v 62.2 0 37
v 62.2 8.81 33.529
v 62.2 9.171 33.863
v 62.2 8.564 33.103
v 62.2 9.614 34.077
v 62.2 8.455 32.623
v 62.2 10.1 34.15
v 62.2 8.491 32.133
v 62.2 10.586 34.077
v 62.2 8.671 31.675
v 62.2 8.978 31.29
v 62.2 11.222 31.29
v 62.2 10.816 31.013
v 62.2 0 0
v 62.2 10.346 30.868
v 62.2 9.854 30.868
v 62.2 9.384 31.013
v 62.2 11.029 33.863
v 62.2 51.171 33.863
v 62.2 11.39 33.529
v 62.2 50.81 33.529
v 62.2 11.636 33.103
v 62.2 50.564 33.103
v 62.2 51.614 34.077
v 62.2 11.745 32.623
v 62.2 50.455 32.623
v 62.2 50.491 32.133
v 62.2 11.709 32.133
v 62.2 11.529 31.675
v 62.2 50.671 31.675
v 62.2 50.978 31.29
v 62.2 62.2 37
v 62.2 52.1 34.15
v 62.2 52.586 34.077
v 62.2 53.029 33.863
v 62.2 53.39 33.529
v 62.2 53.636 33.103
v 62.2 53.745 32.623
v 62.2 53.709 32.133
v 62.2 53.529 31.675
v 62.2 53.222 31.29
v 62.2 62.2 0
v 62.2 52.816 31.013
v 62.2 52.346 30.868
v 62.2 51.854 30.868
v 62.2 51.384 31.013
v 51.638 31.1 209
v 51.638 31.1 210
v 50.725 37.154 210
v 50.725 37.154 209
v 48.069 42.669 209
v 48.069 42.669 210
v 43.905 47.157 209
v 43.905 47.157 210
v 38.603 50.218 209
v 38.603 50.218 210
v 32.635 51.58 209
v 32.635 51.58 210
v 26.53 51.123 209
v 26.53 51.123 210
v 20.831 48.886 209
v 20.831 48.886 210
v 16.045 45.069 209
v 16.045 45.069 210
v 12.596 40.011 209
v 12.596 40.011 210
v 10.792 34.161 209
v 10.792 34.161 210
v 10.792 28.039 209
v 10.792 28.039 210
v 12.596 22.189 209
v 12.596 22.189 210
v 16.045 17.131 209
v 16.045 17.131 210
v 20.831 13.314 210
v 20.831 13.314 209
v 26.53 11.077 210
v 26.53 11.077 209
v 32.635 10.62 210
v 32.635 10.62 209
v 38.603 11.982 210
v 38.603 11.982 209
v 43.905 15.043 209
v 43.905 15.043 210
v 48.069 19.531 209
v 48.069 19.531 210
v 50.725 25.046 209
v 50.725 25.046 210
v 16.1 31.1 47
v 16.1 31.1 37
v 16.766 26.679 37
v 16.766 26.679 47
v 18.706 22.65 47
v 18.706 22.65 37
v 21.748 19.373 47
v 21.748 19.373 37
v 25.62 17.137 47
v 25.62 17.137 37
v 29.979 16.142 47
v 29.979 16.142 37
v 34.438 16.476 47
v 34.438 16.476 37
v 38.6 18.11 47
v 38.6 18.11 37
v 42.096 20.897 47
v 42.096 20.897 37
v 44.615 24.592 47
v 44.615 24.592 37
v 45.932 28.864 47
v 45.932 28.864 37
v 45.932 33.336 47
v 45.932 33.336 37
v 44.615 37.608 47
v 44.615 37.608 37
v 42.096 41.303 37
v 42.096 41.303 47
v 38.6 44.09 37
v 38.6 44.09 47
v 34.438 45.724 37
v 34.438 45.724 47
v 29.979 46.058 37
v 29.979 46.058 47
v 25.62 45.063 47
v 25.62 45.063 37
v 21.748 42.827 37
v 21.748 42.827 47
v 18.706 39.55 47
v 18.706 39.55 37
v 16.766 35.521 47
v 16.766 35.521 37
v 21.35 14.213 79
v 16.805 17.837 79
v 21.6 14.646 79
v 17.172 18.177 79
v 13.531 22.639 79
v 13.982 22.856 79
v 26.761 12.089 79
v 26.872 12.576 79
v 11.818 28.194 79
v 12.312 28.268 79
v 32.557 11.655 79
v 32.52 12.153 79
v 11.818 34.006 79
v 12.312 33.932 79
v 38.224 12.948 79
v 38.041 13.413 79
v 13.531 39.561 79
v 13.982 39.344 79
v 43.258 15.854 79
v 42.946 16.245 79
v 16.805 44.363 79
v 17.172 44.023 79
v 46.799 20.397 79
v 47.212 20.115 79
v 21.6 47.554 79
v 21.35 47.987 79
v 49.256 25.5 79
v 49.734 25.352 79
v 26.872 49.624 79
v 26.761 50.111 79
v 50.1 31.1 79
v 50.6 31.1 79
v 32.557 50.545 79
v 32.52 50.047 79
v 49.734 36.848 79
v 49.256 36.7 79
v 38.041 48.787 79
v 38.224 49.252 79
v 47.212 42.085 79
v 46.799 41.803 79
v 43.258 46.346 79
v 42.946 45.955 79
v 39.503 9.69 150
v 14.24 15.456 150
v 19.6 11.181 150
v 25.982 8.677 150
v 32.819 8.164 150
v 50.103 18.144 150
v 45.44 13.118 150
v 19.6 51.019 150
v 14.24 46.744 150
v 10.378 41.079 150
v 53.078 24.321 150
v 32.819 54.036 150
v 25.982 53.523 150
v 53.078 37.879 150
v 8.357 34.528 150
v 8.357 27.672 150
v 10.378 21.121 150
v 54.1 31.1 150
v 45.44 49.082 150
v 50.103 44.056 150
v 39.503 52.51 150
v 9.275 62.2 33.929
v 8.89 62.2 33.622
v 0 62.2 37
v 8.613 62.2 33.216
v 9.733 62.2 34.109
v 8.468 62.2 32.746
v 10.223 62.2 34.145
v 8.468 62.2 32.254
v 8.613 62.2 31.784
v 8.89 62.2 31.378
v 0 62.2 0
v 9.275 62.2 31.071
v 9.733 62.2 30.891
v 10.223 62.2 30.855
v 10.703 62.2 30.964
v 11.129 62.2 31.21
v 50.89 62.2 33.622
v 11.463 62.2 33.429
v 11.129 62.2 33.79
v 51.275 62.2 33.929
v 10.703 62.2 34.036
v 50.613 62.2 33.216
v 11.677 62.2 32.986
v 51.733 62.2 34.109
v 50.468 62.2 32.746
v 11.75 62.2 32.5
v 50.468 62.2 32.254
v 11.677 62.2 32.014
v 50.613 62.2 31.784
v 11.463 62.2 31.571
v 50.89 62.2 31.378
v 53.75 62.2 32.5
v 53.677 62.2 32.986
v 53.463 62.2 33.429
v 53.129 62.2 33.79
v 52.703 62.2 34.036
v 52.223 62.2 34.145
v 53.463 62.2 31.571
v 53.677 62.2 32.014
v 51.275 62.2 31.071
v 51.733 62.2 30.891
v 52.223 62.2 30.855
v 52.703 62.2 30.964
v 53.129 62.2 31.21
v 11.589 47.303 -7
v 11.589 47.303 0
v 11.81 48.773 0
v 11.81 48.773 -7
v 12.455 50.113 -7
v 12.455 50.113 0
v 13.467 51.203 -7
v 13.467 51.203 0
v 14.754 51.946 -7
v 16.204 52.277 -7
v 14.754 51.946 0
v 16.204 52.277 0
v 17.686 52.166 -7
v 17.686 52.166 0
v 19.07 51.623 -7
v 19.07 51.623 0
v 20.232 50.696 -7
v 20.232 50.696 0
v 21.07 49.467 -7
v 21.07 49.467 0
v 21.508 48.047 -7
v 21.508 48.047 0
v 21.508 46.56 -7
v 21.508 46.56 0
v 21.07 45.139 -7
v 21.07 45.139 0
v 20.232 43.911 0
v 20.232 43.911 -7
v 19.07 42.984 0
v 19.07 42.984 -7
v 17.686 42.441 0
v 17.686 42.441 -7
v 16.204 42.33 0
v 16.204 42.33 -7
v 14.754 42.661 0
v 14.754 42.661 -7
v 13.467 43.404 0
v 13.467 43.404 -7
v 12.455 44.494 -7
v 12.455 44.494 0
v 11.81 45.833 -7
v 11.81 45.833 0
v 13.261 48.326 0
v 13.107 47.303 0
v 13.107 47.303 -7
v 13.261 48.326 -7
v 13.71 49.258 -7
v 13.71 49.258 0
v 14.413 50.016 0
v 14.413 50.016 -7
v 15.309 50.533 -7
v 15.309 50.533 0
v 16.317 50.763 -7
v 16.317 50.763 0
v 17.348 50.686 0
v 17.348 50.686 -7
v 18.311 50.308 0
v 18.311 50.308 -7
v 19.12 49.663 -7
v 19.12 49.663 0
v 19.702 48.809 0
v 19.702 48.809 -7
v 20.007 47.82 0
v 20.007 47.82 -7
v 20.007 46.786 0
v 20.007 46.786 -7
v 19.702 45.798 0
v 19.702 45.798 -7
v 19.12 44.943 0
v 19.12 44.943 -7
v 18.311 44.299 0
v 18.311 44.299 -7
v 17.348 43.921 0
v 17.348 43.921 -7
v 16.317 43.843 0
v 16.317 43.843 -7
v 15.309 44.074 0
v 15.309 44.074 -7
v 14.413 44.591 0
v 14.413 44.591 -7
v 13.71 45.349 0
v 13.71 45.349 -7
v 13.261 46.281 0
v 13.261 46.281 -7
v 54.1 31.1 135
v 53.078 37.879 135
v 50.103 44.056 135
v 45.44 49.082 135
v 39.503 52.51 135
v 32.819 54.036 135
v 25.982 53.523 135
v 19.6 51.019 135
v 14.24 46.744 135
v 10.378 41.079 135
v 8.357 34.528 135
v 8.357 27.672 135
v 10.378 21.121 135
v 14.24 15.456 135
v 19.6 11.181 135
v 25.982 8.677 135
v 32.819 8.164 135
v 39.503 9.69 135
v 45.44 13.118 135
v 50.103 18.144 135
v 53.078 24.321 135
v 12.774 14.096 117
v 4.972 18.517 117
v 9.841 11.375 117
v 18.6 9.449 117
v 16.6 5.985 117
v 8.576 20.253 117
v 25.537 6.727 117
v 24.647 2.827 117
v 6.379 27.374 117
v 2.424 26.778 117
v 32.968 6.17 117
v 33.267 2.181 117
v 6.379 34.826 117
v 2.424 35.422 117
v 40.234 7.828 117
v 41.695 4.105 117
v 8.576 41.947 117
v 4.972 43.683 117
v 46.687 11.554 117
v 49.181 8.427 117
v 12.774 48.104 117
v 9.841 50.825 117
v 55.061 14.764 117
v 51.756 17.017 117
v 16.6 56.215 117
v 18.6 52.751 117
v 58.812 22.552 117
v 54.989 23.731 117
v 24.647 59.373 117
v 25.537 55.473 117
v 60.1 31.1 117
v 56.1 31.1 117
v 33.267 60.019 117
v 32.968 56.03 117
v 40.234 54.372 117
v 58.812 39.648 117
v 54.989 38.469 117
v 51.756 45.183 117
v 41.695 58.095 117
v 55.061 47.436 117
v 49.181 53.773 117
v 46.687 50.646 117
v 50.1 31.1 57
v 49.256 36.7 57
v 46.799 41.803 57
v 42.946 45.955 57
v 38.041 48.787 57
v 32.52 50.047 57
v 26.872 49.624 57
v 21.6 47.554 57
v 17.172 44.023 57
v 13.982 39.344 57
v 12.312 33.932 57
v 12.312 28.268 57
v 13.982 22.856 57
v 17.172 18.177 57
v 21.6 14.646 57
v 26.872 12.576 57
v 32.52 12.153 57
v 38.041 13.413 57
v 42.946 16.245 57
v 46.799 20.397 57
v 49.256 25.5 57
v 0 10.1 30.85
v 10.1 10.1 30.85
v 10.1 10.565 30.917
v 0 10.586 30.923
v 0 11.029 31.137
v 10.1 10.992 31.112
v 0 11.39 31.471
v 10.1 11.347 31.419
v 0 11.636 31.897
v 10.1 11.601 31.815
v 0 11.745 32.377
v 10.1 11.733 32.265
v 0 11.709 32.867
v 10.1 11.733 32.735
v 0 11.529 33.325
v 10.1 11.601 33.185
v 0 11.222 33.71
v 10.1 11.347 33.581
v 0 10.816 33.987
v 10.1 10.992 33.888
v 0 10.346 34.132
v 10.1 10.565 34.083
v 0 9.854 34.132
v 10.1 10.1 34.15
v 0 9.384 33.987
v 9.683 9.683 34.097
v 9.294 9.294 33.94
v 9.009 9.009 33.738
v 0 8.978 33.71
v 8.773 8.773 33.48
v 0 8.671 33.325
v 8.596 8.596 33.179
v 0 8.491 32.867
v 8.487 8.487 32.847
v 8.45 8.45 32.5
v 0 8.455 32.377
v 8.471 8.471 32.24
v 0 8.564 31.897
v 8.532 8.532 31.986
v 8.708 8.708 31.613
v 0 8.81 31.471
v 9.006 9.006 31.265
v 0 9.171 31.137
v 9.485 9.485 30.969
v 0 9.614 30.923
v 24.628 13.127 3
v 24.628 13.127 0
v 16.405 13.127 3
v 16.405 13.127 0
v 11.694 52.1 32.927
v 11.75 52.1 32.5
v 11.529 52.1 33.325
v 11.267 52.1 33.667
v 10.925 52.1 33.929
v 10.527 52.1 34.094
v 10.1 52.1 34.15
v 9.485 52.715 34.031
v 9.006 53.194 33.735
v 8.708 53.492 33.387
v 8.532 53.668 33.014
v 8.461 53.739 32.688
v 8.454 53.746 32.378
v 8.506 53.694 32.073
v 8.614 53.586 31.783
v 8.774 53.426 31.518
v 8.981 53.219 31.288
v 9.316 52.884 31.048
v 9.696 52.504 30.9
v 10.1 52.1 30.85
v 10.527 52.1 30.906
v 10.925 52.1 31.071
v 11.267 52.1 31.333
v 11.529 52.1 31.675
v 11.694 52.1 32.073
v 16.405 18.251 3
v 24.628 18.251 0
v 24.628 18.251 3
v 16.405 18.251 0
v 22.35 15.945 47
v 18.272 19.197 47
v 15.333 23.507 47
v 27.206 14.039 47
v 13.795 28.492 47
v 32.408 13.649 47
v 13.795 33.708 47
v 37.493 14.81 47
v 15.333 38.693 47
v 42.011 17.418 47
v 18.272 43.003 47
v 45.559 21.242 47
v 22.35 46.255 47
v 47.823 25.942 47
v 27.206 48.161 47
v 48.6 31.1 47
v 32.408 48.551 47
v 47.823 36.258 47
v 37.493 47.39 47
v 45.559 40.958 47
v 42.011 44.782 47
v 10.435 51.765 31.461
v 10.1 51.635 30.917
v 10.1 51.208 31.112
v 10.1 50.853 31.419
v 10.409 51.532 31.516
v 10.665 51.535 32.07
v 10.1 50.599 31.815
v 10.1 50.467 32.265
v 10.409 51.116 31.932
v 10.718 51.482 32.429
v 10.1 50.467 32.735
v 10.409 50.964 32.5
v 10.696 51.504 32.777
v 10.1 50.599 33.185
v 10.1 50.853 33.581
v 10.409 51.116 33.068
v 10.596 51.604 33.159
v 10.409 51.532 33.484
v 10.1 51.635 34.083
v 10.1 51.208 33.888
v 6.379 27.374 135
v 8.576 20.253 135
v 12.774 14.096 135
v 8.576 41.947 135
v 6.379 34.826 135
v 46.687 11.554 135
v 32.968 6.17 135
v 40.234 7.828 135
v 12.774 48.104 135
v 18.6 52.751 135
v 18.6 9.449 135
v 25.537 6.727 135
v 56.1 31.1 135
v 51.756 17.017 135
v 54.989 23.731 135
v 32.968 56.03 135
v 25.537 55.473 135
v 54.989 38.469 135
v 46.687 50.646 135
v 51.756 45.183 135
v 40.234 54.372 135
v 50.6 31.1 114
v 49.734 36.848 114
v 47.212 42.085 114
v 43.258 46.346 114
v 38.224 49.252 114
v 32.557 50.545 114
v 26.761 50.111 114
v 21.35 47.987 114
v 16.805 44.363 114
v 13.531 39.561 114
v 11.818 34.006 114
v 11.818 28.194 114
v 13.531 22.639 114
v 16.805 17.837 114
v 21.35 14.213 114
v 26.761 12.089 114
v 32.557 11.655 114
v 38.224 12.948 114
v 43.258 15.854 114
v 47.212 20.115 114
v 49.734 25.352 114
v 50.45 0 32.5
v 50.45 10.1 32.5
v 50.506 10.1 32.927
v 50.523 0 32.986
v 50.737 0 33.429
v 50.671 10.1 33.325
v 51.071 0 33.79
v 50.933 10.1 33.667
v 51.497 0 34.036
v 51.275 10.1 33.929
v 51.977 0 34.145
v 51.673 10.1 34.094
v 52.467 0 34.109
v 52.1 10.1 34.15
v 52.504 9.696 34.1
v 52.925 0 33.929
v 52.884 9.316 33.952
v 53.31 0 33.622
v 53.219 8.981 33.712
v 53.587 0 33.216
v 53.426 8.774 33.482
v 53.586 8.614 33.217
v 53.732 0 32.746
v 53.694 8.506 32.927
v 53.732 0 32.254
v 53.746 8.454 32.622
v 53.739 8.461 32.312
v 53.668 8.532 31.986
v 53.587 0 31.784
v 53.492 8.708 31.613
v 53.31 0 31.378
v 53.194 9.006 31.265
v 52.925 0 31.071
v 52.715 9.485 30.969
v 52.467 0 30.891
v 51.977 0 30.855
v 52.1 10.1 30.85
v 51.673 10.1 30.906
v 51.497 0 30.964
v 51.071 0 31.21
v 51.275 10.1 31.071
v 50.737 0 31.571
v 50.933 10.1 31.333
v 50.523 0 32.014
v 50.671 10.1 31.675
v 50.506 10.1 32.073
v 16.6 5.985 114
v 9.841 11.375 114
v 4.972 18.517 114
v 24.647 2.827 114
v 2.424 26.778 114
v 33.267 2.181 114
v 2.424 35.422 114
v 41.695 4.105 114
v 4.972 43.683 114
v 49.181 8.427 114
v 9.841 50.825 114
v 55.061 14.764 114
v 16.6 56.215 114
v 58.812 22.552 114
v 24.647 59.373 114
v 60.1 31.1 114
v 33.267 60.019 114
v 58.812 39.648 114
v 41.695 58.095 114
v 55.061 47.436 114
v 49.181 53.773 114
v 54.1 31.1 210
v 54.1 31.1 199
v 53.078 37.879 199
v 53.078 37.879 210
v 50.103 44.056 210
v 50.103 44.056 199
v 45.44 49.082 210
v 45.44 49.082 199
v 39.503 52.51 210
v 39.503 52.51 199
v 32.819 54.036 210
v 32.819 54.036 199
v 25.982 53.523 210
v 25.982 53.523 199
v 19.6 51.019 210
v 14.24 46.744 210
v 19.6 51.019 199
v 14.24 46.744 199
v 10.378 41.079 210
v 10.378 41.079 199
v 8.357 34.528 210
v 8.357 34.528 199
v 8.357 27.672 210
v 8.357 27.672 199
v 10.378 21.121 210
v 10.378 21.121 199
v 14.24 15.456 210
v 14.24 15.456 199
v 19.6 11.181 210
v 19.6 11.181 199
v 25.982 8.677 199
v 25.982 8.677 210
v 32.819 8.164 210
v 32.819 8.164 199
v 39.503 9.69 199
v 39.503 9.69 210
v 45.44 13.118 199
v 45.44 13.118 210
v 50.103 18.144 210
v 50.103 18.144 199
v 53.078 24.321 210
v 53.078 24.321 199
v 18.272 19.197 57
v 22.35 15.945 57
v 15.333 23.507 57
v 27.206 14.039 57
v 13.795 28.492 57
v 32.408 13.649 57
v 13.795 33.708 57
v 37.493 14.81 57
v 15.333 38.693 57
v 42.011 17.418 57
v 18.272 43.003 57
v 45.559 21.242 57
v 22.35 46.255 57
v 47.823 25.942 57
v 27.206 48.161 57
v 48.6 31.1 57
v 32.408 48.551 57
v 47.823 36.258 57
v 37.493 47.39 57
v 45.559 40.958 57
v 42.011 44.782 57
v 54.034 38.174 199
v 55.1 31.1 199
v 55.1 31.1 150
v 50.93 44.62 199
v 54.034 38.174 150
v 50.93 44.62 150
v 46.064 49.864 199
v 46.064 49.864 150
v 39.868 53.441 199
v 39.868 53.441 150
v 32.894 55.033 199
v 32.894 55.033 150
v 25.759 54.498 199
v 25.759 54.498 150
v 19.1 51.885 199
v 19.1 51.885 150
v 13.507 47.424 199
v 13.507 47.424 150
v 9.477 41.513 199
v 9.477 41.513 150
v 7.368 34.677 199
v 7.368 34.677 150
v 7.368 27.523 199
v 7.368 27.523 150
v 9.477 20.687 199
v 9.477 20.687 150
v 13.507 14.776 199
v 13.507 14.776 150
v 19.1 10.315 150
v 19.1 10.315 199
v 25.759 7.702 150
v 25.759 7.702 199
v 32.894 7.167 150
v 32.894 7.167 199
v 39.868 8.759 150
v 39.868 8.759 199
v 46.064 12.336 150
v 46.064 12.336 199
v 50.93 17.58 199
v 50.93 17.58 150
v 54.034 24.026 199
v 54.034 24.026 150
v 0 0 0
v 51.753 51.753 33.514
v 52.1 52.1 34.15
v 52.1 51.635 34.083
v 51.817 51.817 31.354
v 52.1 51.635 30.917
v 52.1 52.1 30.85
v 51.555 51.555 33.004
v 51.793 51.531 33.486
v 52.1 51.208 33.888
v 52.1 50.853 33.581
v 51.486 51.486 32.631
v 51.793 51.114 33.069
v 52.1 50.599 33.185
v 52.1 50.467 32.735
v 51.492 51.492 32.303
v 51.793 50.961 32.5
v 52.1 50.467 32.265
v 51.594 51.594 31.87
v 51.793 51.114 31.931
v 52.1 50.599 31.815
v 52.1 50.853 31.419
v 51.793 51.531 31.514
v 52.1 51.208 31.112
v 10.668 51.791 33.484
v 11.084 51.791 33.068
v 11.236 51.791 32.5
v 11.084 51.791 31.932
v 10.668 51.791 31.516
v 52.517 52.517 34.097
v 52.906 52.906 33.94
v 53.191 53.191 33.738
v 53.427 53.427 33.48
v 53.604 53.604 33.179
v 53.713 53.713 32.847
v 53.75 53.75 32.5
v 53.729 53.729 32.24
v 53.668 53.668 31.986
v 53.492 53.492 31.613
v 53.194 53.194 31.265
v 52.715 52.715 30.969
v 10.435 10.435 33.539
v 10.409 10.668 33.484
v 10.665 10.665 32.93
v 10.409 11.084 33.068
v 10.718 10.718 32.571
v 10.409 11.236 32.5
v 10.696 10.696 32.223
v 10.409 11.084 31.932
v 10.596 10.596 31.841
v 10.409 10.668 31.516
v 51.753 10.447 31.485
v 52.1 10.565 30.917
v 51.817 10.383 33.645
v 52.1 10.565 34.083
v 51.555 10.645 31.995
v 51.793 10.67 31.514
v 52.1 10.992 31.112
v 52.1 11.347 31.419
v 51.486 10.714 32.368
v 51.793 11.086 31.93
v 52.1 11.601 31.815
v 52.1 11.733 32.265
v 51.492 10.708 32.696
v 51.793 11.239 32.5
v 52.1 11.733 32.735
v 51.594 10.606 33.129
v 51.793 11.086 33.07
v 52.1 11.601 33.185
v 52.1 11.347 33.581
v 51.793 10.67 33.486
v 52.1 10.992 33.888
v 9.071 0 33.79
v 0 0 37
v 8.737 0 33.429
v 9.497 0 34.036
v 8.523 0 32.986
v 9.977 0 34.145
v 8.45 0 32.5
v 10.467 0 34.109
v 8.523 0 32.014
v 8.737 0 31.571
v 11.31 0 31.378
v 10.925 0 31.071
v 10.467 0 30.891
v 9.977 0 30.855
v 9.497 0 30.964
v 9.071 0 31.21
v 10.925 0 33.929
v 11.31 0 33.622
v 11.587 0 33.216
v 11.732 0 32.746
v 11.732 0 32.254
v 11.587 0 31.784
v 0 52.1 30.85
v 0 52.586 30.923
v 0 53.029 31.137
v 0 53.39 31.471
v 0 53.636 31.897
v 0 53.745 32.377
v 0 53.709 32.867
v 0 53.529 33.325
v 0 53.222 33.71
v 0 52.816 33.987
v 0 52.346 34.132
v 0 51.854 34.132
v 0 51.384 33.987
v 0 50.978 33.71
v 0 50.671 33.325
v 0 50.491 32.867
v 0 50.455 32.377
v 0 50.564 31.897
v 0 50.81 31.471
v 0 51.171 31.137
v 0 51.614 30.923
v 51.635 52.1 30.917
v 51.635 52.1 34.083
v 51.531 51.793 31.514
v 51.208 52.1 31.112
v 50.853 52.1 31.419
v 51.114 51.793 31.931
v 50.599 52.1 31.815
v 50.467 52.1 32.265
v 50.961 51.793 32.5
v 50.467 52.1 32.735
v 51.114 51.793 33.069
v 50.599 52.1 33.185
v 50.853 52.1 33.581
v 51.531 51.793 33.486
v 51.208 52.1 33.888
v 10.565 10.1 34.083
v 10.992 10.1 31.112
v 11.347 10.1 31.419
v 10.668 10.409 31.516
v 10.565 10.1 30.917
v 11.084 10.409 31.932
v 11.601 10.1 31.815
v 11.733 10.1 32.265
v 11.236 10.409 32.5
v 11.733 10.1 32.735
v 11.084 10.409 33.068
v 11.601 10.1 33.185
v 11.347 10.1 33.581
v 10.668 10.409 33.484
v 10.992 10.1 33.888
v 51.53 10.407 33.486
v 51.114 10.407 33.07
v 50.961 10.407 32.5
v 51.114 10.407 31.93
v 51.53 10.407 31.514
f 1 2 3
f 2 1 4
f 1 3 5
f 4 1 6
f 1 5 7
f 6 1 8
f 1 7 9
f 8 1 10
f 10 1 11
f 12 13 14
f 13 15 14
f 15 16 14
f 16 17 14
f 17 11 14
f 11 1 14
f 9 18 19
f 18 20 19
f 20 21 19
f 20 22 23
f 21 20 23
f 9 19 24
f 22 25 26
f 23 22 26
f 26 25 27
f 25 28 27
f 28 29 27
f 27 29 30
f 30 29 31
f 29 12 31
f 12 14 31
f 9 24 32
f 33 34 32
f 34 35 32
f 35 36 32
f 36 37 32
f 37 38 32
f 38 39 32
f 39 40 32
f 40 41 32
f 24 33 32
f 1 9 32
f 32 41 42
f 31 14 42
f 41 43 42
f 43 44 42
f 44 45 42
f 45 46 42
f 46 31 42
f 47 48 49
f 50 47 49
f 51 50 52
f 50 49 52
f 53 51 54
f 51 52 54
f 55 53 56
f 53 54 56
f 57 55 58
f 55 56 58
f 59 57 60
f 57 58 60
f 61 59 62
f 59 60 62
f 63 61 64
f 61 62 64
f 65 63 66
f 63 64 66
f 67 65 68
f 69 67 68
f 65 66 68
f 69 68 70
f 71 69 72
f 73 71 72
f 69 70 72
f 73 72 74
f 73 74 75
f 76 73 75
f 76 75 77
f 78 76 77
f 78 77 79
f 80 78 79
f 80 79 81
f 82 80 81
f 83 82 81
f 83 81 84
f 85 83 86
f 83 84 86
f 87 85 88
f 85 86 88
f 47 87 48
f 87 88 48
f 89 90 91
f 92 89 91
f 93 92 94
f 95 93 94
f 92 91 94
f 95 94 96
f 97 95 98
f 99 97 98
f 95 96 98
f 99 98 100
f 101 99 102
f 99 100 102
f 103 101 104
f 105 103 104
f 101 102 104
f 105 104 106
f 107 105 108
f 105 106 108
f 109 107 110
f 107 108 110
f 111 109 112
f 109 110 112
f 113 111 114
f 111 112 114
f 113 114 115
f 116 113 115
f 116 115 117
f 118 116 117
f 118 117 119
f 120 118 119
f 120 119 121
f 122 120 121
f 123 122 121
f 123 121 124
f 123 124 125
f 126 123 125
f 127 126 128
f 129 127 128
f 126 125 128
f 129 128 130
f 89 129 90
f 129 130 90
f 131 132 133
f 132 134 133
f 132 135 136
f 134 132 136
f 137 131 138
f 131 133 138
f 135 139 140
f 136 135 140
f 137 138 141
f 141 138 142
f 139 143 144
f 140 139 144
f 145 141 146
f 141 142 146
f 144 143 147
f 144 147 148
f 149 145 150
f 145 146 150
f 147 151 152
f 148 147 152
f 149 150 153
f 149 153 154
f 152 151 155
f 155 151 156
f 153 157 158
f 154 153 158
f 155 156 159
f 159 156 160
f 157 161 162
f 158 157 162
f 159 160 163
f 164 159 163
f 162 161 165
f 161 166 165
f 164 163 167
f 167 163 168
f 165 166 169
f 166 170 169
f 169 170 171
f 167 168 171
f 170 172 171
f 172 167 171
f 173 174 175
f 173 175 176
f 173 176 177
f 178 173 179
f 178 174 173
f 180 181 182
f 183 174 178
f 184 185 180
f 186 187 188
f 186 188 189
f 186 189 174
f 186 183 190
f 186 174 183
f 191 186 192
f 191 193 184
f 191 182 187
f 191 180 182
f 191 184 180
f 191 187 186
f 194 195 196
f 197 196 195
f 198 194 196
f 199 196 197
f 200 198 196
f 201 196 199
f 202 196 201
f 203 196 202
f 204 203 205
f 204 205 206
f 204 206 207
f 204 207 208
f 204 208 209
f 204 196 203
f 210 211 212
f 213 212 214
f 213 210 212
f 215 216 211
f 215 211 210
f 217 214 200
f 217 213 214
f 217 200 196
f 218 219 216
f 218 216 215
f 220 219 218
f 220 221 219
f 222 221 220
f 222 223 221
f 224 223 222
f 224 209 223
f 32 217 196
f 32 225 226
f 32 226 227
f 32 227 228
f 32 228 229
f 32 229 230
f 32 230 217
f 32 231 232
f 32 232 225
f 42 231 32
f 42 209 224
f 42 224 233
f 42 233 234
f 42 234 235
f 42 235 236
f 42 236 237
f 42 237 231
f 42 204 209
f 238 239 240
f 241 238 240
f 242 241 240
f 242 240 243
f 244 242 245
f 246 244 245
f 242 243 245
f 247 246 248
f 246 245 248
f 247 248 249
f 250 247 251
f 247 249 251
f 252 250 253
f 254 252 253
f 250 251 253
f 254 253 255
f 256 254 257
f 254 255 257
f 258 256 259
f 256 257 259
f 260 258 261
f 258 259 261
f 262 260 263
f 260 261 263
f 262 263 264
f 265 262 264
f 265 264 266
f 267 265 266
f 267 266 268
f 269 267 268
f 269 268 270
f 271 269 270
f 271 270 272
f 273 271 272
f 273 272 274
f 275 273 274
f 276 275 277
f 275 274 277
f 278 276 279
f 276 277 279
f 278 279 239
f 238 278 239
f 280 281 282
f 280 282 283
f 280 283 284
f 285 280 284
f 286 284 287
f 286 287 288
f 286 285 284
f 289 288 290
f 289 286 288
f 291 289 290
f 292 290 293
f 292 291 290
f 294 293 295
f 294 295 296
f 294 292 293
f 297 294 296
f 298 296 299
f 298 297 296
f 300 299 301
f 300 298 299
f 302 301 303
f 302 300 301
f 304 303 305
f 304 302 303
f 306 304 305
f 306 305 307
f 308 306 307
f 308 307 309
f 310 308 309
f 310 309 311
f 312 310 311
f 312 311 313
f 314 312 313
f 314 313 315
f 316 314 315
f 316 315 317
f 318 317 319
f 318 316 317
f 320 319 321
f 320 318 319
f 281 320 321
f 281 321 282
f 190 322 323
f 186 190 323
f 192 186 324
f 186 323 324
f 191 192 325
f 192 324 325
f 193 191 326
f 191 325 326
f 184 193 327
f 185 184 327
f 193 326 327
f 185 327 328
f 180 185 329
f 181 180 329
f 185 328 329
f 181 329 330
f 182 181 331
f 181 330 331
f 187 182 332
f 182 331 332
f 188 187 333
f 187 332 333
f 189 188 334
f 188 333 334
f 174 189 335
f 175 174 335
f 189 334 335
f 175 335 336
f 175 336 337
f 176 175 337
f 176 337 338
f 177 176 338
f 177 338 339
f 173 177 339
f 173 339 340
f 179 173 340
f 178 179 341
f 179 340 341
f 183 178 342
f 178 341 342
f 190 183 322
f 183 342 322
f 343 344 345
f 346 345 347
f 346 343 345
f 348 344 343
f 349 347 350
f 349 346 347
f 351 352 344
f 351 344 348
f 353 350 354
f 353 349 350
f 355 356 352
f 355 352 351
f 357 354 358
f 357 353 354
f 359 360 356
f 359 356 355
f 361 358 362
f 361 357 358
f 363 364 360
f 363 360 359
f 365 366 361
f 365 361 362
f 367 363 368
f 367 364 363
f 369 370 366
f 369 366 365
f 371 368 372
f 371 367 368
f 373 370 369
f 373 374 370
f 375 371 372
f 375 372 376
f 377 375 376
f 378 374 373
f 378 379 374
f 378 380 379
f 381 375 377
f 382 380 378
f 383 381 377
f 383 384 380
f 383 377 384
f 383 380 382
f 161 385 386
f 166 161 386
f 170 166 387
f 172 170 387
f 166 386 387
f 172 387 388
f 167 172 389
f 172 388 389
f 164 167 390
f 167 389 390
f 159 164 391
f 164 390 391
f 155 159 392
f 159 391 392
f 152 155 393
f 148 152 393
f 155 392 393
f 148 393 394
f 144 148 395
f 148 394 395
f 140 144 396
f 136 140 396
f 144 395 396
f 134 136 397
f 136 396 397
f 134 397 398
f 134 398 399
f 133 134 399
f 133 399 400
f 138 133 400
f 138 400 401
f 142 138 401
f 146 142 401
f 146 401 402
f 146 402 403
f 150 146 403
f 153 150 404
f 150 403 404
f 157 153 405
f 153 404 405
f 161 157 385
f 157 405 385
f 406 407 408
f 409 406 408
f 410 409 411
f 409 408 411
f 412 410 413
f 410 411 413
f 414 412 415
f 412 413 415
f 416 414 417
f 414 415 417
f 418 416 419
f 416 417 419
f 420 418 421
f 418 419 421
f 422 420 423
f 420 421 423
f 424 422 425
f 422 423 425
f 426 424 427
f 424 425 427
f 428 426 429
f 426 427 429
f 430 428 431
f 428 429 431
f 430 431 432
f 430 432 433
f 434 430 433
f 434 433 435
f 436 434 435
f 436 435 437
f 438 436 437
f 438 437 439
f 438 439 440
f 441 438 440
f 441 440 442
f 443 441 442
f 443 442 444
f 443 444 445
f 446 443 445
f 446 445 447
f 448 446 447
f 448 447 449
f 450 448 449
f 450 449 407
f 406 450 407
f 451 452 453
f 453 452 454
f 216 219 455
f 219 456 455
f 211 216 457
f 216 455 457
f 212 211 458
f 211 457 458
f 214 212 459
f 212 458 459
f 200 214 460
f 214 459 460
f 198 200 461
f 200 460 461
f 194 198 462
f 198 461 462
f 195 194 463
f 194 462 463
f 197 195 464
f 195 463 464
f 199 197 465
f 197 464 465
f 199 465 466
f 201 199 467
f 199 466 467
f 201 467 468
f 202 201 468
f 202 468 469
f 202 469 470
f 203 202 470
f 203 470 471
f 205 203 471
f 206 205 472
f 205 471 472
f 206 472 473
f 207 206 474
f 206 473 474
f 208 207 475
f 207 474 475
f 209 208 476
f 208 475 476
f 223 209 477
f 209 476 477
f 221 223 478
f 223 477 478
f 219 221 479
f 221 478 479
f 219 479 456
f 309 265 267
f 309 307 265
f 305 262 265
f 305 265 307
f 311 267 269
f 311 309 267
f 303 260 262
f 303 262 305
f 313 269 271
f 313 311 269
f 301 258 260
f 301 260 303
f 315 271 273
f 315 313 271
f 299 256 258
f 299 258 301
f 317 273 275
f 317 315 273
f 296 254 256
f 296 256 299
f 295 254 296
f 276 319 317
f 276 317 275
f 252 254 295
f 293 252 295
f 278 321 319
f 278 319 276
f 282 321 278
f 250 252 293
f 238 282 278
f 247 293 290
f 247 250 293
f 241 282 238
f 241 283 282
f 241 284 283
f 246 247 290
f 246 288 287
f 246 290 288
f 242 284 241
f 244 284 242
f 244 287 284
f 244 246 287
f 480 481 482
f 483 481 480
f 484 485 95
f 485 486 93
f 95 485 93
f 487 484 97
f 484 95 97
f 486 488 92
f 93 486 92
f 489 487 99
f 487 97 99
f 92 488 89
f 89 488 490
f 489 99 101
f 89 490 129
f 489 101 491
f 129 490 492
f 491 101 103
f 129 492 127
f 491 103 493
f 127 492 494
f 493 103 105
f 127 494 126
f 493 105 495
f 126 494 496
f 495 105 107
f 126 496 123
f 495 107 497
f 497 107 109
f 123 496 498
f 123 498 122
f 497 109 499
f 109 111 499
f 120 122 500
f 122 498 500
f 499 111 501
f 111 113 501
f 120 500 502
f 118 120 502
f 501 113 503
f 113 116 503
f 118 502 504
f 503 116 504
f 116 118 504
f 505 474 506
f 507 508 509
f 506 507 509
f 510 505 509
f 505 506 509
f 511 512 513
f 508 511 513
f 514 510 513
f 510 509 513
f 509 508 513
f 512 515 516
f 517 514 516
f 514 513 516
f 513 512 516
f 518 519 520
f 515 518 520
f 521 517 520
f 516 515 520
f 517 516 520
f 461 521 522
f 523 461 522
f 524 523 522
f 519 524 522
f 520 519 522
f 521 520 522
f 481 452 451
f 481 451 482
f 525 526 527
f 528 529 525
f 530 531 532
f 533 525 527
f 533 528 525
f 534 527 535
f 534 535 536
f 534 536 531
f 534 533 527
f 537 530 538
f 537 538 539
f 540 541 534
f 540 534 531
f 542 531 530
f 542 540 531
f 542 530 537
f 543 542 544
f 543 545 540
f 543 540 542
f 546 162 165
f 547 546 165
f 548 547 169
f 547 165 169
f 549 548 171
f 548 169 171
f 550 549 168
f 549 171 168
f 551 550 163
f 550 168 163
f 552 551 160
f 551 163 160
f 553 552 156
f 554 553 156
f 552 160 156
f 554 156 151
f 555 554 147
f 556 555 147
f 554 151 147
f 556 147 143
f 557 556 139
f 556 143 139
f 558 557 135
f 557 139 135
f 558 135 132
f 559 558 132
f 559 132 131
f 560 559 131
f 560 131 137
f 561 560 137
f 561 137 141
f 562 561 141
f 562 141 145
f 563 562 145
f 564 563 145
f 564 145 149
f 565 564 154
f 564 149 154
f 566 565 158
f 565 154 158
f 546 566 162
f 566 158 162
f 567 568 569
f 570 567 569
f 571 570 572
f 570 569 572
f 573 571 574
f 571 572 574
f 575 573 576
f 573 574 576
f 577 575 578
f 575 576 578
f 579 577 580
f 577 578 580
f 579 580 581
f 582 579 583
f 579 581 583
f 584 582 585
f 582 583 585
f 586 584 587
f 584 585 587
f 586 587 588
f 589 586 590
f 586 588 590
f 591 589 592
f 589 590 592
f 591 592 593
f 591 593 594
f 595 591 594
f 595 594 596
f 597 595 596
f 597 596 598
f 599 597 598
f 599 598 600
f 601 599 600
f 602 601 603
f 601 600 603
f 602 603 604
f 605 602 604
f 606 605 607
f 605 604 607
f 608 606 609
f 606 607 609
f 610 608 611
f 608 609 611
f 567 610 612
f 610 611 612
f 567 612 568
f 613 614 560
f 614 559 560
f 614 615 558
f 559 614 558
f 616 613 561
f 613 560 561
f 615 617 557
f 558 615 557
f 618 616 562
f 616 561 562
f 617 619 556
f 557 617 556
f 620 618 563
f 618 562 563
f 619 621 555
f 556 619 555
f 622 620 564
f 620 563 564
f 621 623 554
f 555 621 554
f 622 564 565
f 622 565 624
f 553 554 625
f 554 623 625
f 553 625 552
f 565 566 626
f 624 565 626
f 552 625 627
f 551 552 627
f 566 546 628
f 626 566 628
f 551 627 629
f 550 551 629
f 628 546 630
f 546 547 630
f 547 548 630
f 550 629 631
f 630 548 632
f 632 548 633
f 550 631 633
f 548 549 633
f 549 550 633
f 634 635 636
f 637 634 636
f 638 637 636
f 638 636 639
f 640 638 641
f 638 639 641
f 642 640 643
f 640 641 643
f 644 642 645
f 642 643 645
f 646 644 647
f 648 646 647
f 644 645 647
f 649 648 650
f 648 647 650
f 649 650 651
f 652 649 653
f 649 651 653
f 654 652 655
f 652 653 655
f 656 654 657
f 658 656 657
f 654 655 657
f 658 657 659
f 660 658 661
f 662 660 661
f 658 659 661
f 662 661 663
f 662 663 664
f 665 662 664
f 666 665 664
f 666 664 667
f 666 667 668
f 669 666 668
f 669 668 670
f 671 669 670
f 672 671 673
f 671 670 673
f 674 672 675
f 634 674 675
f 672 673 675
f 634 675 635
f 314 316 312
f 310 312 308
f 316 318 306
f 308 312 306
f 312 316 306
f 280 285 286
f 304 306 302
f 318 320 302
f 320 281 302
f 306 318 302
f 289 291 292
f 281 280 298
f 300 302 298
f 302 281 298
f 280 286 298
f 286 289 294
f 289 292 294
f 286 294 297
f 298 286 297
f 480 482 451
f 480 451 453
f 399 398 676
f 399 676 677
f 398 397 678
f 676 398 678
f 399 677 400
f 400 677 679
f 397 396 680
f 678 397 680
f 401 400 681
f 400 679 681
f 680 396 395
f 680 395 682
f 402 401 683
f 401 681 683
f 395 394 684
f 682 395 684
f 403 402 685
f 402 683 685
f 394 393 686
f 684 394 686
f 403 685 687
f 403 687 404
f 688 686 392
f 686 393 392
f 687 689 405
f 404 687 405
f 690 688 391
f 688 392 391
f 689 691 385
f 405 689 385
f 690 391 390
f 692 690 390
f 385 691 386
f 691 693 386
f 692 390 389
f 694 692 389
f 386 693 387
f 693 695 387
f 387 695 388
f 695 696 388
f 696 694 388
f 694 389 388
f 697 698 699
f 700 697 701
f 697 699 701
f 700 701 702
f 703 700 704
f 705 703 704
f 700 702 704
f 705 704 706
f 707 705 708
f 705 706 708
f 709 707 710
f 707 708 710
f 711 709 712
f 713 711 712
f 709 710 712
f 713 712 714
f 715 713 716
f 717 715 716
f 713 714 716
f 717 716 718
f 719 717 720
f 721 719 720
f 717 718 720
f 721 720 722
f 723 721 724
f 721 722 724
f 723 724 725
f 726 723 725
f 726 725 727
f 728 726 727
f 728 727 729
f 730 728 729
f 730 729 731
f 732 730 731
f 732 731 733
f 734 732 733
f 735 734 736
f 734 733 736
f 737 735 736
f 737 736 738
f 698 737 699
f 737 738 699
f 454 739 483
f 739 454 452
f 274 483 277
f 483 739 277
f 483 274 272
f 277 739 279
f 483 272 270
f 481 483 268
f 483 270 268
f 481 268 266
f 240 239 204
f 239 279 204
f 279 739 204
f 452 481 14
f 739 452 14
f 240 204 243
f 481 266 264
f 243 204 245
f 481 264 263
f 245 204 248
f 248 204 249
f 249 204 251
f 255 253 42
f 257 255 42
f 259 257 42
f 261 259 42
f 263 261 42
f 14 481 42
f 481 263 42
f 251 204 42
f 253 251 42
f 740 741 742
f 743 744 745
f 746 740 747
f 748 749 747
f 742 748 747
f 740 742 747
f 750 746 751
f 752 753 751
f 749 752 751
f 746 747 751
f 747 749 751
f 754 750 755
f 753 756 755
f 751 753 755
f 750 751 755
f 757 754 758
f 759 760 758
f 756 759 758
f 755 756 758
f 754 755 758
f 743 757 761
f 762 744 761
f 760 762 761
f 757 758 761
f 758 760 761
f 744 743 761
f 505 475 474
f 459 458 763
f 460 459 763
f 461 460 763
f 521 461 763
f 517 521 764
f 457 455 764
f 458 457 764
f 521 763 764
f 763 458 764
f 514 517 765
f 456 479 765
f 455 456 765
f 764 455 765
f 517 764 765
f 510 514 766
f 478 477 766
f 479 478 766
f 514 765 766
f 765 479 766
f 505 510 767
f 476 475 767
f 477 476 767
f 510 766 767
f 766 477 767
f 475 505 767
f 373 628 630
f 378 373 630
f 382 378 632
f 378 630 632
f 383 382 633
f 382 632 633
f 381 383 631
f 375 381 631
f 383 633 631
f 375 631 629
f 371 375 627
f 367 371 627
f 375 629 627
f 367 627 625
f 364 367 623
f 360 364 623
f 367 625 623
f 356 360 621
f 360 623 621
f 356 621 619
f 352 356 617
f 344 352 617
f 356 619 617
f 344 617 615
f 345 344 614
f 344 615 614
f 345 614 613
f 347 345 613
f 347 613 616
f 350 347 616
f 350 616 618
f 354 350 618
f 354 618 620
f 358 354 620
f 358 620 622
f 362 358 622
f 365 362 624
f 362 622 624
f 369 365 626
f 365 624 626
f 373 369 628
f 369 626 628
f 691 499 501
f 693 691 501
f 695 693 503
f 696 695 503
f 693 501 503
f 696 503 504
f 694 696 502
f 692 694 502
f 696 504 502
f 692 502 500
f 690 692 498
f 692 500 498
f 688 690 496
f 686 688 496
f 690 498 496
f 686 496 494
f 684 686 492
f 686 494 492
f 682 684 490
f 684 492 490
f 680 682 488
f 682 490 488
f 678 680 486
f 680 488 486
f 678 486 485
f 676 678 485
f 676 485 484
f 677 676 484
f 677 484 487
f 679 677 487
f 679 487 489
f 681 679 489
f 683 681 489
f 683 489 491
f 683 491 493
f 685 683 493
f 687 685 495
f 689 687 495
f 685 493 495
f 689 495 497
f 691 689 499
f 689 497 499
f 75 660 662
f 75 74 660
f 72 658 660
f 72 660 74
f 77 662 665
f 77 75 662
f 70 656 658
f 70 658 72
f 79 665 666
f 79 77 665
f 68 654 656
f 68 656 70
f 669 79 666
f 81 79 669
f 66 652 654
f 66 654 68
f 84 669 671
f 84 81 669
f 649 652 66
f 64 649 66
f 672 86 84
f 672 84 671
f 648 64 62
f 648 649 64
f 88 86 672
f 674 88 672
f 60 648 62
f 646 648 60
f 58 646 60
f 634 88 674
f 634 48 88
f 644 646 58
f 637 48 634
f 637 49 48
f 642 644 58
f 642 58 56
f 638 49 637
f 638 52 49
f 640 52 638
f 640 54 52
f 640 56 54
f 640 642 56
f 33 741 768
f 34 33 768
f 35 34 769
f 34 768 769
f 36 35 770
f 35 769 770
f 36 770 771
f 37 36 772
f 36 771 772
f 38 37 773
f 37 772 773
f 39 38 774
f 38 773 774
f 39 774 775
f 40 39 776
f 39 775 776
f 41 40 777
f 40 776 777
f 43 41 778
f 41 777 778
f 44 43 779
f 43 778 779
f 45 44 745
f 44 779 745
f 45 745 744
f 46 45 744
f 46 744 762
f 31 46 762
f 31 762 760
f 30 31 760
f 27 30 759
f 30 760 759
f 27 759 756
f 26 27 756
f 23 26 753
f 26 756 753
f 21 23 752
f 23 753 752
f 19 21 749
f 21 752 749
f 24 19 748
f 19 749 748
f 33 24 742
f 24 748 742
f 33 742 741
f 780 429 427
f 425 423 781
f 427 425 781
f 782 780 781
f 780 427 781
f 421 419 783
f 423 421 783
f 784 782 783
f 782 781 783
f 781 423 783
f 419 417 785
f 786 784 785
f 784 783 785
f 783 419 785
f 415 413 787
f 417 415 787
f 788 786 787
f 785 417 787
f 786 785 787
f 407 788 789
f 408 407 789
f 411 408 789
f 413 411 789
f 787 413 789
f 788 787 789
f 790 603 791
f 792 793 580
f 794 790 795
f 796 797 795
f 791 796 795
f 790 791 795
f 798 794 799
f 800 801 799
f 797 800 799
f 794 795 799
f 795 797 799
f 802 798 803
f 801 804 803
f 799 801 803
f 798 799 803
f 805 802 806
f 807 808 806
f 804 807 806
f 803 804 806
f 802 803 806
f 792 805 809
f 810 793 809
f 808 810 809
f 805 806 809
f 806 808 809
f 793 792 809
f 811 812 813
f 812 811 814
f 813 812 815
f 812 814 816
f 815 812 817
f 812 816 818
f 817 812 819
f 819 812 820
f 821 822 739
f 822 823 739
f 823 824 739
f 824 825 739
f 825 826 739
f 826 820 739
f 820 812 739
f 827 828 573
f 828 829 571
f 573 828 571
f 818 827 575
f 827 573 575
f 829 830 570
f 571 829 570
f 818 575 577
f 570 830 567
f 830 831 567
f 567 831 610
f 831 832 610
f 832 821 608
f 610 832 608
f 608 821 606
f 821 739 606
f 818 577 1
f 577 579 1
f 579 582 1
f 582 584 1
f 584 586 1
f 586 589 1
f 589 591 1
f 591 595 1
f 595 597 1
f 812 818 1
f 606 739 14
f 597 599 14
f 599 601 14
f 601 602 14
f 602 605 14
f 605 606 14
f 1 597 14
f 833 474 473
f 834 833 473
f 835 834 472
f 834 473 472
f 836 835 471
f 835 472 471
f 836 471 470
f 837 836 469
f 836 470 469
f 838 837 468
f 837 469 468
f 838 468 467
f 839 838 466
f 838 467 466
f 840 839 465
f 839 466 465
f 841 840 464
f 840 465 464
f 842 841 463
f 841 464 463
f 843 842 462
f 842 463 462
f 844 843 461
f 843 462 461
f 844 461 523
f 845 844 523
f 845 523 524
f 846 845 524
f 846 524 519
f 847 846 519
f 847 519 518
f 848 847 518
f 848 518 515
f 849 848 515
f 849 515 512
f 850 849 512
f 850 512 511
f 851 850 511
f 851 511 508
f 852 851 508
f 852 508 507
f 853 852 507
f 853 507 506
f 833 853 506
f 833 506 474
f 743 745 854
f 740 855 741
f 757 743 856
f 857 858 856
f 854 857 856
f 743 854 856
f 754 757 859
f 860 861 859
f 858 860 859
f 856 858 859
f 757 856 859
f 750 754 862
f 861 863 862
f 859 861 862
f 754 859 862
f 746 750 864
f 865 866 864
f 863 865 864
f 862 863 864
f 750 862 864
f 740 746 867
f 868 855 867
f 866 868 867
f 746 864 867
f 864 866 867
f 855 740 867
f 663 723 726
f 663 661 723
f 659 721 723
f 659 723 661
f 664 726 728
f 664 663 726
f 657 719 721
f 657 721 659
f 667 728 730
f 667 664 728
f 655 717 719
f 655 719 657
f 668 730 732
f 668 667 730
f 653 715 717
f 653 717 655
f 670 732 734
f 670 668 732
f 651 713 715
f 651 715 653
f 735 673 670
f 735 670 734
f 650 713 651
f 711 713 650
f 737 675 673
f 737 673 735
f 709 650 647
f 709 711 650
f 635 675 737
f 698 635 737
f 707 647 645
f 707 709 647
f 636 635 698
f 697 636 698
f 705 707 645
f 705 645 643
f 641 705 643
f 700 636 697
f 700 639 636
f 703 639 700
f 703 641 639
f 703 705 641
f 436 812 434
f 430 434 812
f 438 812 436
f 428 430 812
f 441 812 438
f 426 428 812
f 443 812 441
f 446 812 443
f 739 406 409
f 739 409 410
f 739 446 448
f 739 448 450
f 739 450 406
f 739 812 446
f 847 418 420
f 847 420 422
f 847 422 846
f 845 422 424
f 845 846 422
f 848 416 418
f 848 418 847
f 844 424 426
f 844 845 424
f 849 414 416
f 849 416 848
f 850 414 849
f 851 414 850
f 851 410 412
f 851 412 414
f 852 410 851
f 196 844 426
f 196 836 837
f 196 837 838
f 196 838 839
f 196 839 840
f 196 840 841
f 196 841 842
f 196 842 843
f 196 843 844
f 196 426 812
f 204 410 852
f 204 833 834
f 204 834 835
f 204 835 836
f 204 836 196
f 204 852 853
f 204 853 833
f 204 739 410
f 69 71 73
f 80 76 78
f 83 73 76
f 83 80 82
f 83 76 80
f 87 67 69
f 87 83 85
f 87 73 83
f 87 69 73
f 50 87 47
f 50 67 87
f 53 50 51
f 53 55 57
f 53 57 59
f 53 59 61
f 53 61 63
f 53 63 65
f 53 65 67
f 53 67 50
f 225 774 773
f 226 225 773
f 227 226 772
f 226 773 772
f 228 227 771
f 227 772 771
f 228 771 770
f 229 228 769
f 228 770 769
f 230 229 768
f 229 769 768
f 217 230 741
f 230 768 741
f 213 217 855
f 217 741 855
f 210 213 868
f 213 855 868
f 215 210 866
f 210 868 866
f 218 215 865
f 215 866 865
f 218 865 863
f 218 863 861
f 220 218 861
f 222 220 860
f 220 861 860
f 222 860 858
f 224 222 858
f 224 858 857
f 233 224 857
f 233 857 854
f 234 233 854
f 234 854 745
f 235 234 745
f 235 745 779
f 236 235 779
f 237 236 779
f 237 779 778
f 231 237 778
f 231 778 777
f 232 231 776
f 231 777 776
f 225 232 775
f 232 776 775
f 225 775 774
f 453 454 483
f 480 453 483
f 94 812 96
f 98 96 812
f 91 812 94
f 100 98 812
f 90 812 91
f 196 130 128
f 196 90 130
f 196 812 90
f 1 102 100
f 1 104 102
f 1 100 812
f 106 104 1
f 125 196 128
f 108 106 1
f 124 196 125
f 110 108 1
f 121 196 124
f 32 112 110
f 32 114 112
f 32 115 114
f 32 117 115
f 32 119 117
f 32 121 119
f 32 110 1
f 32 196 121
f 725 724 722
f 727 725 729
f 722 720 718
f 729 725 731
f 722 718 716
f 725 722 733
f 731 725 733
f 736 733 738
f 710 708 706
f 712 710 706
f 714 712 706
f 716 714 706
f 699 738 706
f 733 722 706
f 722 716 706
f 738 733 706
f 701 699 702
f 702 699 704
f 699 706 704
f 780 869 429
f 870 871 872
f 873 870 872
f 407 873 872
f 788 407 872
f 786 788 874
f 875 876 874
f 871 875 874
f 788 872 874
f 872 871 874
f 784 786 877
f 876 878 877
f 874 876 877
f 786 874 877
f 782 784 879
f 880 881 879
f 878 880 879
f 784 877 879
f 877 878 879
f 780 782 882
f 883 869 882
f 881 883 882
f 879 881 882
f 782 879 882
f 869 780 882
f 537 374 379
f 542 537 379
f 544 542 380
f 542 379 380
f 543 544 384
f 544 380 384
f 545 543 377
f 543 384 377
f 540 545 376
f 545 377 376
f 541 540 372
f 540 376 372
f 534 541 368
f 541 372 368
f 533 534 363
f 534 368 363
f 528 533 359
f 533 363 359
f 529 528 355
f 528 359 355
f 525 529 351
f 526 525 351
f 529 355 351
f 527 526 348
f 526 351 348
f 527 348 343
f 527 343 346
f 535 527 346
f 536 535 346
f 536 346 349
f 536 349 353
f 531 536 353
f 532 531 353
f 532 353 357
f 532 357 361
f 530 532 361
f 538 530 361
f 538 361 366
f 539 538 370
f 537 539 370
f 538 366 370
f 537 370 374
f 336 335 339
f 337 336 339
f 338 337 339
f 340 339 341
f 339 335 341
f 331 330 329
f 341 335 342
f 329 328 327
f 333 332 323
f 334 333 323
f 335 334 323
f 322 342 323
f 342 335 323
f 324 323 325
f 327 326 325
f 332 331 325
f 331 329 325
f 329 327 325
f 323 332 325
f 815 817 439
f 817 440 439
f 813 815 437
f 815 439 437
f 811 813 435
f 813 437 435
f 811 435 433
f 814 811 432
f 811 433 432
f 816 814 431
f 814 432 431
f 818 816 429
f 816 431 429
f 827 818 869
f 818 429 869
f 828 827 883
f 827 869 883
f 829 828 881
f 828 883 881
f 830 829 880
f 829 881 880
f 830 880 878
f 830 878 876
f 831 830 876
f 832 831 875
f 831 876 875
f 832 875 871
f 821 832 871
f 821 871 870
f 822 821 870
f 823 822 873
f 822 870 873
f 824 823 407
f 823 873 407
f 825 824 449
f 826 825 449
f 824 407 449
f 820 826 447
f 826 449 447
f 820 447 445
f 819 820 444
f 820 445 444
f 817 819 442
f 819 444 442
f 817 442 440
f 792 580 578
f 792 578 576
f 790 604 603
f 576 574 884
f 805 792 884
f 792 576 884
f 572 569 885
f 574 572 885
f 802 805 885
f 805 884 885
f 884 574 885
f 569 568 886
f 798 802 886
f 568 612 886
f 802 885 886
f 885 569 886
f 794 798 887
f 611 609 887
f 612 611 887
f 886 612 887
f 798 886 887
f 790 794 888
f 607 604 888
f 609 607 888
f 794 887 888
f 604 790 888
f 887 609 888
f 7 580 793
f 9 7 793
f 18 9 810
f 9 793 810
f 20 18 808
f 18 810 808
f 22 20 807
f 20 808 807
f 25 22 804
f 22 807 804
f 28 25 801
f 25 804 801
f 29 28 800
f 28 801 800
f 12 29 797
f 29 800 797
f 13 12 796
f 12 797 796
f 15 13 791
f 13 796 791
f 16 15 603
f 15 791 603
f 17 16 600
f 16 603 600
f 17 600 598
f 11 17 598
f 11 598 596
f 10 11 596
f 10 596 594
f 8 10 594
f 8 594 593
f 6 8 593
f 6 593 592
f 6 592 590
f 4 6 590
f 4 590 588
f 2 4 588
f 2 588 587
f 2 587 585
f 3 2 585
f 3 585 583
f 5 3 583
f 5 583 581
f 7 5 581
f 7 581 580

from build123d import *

# Parameters (mm, degrees)
SKETCH_1_W             = 62.2
SKETCH_1_H             = 62.2
EXTRUDE_1_DEPTH        = 37
SKETCH_2_R             = 15
EXTRUDE_2_DEPTH        = 10
SKETCH_3_R             = 17.5
EXTRUDE_3_DEPTH        = 10
SKETCH_4_R             = 19
EXTRUDE_4_DEPTH        = 22
SKETCH_5_R             = 19.5
EXTRUDE_5_DEPTH        = 35
SKETCH_6_R             = 29
EXTRUDE_6_DEPTH        = 3
SKETCH_7_R             = 25
EXTRUDE_7_DEPTH        = 18
SKETCH_9_R             = 4.987570285
SKETCH_9_R_2           = 3.46960963
EXTRUDE_8_DEPTH        = 7
SKETCH_10_W            = 8.223130645
SKETCH_10_H            = 5.124180357
CUT_EXTRUDE_2_DEPTH    = 3
HOLE_WIZARD_M4_1_D     = 3.3
HOLE_WIZARD_M4_1_DEPTH = 10.1
HOLE_WIZARD_M4_1_TIP   = 0.991420021
HOLE_WIZARD_M4_2_D     = 3.3
HOLE_WIZARD_M4_2_DEPTH = 10.1
HOLE_WIZARD_M4_2_TIP   = 0.991420021
HOLE_WIZARD_M4_3_D     = 3.3
HOLE_WIZARD_M4_3_DEPTH = 10.1
HOLE_WIZARD_M4_3_TIP   = 0.991420021
HOLE_WIZARD_M4_4_D     = 3.3
HOLE_WIZARD_M4_4_DEPTH = 10.1
HOLE_WIZARD_M4_4_TIP   = 0.991420021
SKETCH_8_R             = 23
EXTRUDE_9_DEPTH        = 15
SKETCH_19_R            = 24
EXTRUDE_10_DEPTH       = 49
SKETCH_20_R            = 23
EXTRUDE_11_DEPTH       = 11
SKETCH_21_R            = 20.537858868
CUT_EXTRUDE_3_DEPTH    = 1


with BuildPart() as part:
    # 草图1 → 凸台-拉伸1 (new body)
    with BuildSketch(Plane.XY):
        with Locations((31.1, 31.1)):
            Rectangle(SKETCH_1_W, SKETCH_1_H)
    extrude(amount=EXTRUDE_1_DEPTH)

    # 草图2 → 凸台-拉伸2 (add)
    with BuildSketch(Plane.XY.offset(37)):
        with Locations(Location((31.1, 31.1, 0), (0, 0, 180))):
            Circle(SKETCH_2_R)
    extrude(amount=EXTRUDE_2_DEPTH)

    # 草图3 → 凸台-拉伸3 (add)
    with BuildSketch(Plane.XY.offset(47)):
        with Locations((31.1, 31.1)):
            Circle(SKETCH_3_R)
    extrude(amount=EXTRUDE_3_DEPTH)

    # 草图4 → 凸台-拉伸4 (add)
    with BuildSketch(Plane.XY.offset(57)):
        with Locations((31.1, 31.1)):
            Circle(SKETCH_4_R)
    extrude(amount=EXTRUDE_4_DEPTH)

    # 草图5 → 凸台-拉伸5 (add)
    with BuildSketch(Plane.XY.offset(79)):
        with Locations((31.1, 31.1)):
            Circle(SKETCH_5_R)
    extrude(amount=EXTRUDE_5_DEPTH)

    # 草图6 → 凸台-拉伸6 (add)
    with BuildSketch(Plane.XY.offset(114)):
        with Locations((31.1, 31.1)):
            Circle(SKETCH_6_R)
    extrude(amount=EXTRUDE_6_DEPTH)

    # 草图7 → 凸台-拉伸7 (add)
    with BuildSketch(Plane.XY.offset(117)):
        with Locations((31.1, 31.1)):
            Circle(SKETCH_7_R)
    extrude(amount=EXTRUDE_7_DEPTH)

    # 草图9 → 凸台-拉伸8 (add)
    with BuildSketch(Plane(origin=(0, 0, 0), x_dir=(-1, 0, 0), z_dir=(0, 0, -1))):
        with Locations((-16.576254003, 47.30330958)):
            Circle(SKETCH_9_R)
        with Locations((-16.576254003, 47.30330958)):
            Circle(SKETCH_9_R_2, mode=Mode.SUBTRACT)
    extrude(amount=EXTRUDE_8_DEPTH)

    # 草图10 → 切除-拉伸2 (cut)
    with BuildSketch(Plane(origin=(0, 0, 0), x_dir=(-1, 0, 0), z_dir=(0, 0, -1))):
        with Locations((-20.516916702, 15.688590304)):
            Rectangle(SKETCH_10_W, SKETCH_10_H)
    extrude(amount=-CUT_EXTRUDE_2_DEPTH, mode=Mode.SUBTRACT)

    # M4 螺纹孔1
    with Locations(Plane(origin=(0, 62.2, 0), x_dir=(-1, 0, 0), z_dir=(0, 1, 0))):
        with Locations((-10.1, 32.5), (-52.1, 32.5)):
            Hole(HOLE_WIZARD_M4_1_D / 2, depth=HOLE_WIZARD_M4_1_DEPTH)
            with Locations((0, 0, -(HOLE_WIZARD_M4_1_DEPTH + HOLE_WIZARD_M4_1_TIP / 2))):  # 118° drill point
                Cone(0, HOLE_WIZARD_M4_1_D / 2, HOLE_WIZARD_M4_1_TIP, mode=Mode.SUBTRACT)

    # M4 螺纹孔2
    with Locations(Plane(origin=(62.2, 0, 0), x_dir=(0, 0, -1), z_dir=(1, 0, 0))):
        with Locations((-32.5, 10.1), (-32.5, 52.1)):
            Hole(HOLE_WIZARD_M4_2_D / 2, depth=HOLE_WIZARD_M4_2_DEPTH)
            with Locations((0, 0, -(HOLE_WIZARD_M4_2_DEPTH + HOLE_WIZARD_M4_2_TIP / 2))):  # 118° drill point
                Cone(0, HOLE_WIZARD_M4_2_D / 2, HOLE_WIZARD_M4_2_TIP, mode=Mode.SUBTRACT)

    # M4 螺纹孔3
    with Locations(Plane.XZ):
        with Locations((10.1, 32.5), (52.1, 32.5)):
            Hole(HOLE_WIZARD_M4_3_D / 2, depth=HOLE_WIZARD_M4_3_DEPTH)
            with Locations((0, 0, -(HOLE_WIZARD_M4_3_DEPTH + HOLE_WIZARD_M4_3_TIP / 2))):  # 118° drill point
                Cone(0, HOLE_WIZARD_M4_3_D / 2, HOLE_WIZARD_M4_3_TIP, mode=Mode.SUBTRACT)

    # M4 螺纹孔4
    with Locations(Plane.ZY):
        with Locations((32.5, 52.1), (32.5, 10.1)):
            Hole(HOLE_WIZARD_M4_4_D / 2, depth=HOLE_WIZARD_M4_4_DEPTH)
            with Locations((0, 0, -(HOLE_WIZARD_M4_4_DEPTH + HOLE_WIZARD_M4_4_TIP / 2))):  # 118° drill point
                Cone(0, HOLE_WIZARD_M4_4_D / 2, HOLE_WIZARD_M4_4_TIP, mode=Mode.SUBTRACT)


with BuildPart() as body_2:
    # 草图8 → 凸台-拉伸9 (new body)
    with BuildSketch(Plane.XY.offset(135)):
        with Locations((31.1, 31.1)):
            Circle(SKETCH_8_R)
    extrude(amount=EXTRUDE_9_DEPTH)


with BuildPart() as body_3:
    # 草图19 → 凸台-拉伸10 (new body)
    with BuildSketch(Plane.XY.offset(150)):
        with Locations((31.1, 31.1)):
            Circle(SKETCH_19_R)
    extrude(amount=EXTRUDE_10_DEPTH)

    # 草图20 → 凸台-拉伸11 (add)
    with BuildSketch(Plane.XY.offset(199)):
        with Locations((31.1, 31.1)):
            Circle(SKETCH_20_R)
    extrude(amount=EXTRUDE_11_DEPTH)

    # 草图21 → 切除-拉伸3 (cut)
    with BuildSketch(Plane.XY.offset(210)):
        with Locations((31.1, 31.1)):
            Circle(SKETCH_21_R)
    extrude(amount=-CUT_EXTRUDE_3_DEPTH, mode=Mode.SUBTRACT)


solid = Compound([part.part, body_2.part, body_3.part])
